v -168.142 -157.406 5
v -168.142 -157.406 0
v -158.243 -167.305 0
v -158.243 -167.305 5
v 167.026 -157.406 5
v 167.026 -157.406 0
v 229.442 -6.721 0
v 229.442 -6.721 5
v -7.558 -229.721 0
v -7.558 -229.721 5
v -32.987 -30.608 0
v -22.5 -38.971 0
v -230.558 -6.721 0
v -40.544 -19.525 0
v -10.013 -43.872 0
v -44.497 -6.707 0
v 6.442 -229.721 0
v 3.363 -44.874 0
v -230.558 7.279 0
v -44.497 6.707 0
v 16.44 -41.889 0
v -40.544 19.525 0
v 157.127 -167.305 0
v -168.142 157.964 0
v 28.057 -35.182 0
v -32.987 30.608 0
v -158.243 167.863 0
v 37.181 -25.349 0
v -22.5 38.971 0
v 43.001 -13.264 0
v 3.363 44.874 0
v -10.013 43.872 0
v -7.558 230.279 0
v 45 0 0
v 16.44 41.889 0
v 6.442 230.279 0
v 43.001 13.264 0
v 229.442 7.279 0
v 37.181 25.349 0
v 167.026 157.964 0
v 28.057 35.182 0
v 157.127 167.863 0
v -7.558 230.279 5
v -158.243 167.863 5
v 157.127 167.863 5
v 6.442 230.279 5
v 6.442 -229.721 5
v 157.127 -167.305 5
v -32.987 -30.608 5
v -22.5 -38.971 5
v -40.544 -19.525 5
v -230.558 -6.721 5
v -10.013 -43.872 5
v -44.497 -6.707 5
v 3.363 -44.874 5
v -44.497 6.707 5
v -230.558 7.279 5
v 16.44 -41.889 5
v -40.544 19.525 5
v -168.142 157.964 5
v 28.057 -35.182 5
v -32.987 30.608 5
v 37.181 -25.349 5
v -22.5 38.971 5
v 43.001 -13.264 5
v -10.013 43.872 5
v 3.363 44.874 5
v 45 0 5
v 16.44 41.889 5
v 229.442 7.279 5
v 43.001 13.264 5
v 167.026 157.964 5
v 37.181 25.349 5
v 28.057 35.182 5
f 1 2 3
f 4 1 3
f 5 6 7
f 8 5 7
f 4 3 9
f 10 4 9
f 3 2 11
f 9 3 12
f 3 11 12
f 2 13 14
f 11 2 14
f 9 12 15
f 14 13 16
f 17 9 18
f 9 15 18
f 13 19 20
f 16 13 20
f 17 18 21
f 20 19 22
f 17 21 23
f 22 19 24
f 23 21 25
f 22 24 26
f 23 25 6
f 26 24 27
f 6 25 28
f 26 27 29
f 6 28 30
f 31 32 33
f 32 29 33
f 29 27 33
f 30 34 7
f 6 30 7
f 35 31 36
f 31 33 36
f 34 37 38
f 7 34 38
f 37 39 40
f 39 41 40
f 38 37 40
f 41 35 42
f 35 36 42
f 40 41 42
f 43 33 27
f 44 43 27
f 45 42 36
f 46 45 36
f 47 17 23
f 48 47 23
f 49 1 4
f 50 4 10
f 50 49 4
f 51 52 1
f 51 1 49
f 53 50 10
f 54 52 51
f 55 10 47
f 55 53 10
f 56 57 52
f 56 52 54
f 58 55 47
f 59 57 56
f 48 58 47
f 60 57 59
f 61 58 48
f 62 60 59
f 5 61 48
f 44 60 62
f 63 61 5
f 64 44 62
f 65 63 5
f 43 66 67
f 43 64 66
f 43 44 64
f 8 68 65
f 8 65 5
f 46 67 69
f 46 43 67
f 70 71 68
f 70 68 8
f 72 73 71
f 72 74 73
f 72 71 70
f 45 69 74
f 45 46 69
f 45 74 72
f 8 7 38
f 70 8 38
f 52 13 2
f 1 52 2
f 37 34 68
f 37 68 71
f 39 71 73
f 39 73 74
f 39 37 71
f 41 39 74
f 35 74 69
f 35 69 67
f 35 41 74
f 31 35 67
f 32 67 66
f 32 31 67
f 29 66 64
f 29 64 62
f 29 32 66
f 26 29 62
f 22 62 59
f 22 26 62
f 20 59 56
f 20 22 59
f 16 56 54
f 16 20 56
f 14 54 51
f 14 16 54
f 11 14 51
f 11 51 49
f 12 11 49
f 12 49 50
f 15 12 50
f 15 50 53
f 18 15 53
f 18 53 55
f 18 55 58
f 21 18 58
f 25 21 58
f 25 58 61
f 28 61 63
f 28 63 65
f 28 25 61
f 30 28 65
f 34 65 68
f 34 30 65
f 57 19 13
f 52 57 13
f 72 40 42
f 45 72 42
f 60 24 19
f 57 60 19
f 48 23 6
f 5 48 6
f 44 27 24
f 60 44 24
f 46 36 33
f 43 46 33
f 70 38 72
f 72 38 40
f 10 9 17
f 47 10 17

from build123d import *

# Parameters (mm, degrees)
SKETCH1_R           = 45
BOSS_EXTRUDE1_DEPTH = 5


with BuildPart() as part:
    # Sketch1 → Boss-Extrude1 (new body)
    with BuildSketch(Plane.XY):
        Polygon((-230.557942617, -6.721028691), (-168.142249758, -157.405840896), (-158.242754822, -167.305335833), (-7.557942617, -229.721028692), (6.442057383, -229.721028692), (157.126869588, -167.305335833), (167.026364524, -157.405840896), (229.442057383, -6.721028691), (229.442057383, 7.278971309), (167.026364524, 157.963783513), (157.126869588, 167.86327845), (6.442057383, 230.278971308), (-7.557942617, 230.278971308), (-158.242754822, 167.86327845), (-168.142249758, 157.963783513), (-230.557942617, 7.278971308), align=None)
        Circle(SKETCH1_R, mode=Mode.SUBTRACT)
    extrude(amount=BOSS_EXTRUDE1_DEPTH)


solid = part.part
